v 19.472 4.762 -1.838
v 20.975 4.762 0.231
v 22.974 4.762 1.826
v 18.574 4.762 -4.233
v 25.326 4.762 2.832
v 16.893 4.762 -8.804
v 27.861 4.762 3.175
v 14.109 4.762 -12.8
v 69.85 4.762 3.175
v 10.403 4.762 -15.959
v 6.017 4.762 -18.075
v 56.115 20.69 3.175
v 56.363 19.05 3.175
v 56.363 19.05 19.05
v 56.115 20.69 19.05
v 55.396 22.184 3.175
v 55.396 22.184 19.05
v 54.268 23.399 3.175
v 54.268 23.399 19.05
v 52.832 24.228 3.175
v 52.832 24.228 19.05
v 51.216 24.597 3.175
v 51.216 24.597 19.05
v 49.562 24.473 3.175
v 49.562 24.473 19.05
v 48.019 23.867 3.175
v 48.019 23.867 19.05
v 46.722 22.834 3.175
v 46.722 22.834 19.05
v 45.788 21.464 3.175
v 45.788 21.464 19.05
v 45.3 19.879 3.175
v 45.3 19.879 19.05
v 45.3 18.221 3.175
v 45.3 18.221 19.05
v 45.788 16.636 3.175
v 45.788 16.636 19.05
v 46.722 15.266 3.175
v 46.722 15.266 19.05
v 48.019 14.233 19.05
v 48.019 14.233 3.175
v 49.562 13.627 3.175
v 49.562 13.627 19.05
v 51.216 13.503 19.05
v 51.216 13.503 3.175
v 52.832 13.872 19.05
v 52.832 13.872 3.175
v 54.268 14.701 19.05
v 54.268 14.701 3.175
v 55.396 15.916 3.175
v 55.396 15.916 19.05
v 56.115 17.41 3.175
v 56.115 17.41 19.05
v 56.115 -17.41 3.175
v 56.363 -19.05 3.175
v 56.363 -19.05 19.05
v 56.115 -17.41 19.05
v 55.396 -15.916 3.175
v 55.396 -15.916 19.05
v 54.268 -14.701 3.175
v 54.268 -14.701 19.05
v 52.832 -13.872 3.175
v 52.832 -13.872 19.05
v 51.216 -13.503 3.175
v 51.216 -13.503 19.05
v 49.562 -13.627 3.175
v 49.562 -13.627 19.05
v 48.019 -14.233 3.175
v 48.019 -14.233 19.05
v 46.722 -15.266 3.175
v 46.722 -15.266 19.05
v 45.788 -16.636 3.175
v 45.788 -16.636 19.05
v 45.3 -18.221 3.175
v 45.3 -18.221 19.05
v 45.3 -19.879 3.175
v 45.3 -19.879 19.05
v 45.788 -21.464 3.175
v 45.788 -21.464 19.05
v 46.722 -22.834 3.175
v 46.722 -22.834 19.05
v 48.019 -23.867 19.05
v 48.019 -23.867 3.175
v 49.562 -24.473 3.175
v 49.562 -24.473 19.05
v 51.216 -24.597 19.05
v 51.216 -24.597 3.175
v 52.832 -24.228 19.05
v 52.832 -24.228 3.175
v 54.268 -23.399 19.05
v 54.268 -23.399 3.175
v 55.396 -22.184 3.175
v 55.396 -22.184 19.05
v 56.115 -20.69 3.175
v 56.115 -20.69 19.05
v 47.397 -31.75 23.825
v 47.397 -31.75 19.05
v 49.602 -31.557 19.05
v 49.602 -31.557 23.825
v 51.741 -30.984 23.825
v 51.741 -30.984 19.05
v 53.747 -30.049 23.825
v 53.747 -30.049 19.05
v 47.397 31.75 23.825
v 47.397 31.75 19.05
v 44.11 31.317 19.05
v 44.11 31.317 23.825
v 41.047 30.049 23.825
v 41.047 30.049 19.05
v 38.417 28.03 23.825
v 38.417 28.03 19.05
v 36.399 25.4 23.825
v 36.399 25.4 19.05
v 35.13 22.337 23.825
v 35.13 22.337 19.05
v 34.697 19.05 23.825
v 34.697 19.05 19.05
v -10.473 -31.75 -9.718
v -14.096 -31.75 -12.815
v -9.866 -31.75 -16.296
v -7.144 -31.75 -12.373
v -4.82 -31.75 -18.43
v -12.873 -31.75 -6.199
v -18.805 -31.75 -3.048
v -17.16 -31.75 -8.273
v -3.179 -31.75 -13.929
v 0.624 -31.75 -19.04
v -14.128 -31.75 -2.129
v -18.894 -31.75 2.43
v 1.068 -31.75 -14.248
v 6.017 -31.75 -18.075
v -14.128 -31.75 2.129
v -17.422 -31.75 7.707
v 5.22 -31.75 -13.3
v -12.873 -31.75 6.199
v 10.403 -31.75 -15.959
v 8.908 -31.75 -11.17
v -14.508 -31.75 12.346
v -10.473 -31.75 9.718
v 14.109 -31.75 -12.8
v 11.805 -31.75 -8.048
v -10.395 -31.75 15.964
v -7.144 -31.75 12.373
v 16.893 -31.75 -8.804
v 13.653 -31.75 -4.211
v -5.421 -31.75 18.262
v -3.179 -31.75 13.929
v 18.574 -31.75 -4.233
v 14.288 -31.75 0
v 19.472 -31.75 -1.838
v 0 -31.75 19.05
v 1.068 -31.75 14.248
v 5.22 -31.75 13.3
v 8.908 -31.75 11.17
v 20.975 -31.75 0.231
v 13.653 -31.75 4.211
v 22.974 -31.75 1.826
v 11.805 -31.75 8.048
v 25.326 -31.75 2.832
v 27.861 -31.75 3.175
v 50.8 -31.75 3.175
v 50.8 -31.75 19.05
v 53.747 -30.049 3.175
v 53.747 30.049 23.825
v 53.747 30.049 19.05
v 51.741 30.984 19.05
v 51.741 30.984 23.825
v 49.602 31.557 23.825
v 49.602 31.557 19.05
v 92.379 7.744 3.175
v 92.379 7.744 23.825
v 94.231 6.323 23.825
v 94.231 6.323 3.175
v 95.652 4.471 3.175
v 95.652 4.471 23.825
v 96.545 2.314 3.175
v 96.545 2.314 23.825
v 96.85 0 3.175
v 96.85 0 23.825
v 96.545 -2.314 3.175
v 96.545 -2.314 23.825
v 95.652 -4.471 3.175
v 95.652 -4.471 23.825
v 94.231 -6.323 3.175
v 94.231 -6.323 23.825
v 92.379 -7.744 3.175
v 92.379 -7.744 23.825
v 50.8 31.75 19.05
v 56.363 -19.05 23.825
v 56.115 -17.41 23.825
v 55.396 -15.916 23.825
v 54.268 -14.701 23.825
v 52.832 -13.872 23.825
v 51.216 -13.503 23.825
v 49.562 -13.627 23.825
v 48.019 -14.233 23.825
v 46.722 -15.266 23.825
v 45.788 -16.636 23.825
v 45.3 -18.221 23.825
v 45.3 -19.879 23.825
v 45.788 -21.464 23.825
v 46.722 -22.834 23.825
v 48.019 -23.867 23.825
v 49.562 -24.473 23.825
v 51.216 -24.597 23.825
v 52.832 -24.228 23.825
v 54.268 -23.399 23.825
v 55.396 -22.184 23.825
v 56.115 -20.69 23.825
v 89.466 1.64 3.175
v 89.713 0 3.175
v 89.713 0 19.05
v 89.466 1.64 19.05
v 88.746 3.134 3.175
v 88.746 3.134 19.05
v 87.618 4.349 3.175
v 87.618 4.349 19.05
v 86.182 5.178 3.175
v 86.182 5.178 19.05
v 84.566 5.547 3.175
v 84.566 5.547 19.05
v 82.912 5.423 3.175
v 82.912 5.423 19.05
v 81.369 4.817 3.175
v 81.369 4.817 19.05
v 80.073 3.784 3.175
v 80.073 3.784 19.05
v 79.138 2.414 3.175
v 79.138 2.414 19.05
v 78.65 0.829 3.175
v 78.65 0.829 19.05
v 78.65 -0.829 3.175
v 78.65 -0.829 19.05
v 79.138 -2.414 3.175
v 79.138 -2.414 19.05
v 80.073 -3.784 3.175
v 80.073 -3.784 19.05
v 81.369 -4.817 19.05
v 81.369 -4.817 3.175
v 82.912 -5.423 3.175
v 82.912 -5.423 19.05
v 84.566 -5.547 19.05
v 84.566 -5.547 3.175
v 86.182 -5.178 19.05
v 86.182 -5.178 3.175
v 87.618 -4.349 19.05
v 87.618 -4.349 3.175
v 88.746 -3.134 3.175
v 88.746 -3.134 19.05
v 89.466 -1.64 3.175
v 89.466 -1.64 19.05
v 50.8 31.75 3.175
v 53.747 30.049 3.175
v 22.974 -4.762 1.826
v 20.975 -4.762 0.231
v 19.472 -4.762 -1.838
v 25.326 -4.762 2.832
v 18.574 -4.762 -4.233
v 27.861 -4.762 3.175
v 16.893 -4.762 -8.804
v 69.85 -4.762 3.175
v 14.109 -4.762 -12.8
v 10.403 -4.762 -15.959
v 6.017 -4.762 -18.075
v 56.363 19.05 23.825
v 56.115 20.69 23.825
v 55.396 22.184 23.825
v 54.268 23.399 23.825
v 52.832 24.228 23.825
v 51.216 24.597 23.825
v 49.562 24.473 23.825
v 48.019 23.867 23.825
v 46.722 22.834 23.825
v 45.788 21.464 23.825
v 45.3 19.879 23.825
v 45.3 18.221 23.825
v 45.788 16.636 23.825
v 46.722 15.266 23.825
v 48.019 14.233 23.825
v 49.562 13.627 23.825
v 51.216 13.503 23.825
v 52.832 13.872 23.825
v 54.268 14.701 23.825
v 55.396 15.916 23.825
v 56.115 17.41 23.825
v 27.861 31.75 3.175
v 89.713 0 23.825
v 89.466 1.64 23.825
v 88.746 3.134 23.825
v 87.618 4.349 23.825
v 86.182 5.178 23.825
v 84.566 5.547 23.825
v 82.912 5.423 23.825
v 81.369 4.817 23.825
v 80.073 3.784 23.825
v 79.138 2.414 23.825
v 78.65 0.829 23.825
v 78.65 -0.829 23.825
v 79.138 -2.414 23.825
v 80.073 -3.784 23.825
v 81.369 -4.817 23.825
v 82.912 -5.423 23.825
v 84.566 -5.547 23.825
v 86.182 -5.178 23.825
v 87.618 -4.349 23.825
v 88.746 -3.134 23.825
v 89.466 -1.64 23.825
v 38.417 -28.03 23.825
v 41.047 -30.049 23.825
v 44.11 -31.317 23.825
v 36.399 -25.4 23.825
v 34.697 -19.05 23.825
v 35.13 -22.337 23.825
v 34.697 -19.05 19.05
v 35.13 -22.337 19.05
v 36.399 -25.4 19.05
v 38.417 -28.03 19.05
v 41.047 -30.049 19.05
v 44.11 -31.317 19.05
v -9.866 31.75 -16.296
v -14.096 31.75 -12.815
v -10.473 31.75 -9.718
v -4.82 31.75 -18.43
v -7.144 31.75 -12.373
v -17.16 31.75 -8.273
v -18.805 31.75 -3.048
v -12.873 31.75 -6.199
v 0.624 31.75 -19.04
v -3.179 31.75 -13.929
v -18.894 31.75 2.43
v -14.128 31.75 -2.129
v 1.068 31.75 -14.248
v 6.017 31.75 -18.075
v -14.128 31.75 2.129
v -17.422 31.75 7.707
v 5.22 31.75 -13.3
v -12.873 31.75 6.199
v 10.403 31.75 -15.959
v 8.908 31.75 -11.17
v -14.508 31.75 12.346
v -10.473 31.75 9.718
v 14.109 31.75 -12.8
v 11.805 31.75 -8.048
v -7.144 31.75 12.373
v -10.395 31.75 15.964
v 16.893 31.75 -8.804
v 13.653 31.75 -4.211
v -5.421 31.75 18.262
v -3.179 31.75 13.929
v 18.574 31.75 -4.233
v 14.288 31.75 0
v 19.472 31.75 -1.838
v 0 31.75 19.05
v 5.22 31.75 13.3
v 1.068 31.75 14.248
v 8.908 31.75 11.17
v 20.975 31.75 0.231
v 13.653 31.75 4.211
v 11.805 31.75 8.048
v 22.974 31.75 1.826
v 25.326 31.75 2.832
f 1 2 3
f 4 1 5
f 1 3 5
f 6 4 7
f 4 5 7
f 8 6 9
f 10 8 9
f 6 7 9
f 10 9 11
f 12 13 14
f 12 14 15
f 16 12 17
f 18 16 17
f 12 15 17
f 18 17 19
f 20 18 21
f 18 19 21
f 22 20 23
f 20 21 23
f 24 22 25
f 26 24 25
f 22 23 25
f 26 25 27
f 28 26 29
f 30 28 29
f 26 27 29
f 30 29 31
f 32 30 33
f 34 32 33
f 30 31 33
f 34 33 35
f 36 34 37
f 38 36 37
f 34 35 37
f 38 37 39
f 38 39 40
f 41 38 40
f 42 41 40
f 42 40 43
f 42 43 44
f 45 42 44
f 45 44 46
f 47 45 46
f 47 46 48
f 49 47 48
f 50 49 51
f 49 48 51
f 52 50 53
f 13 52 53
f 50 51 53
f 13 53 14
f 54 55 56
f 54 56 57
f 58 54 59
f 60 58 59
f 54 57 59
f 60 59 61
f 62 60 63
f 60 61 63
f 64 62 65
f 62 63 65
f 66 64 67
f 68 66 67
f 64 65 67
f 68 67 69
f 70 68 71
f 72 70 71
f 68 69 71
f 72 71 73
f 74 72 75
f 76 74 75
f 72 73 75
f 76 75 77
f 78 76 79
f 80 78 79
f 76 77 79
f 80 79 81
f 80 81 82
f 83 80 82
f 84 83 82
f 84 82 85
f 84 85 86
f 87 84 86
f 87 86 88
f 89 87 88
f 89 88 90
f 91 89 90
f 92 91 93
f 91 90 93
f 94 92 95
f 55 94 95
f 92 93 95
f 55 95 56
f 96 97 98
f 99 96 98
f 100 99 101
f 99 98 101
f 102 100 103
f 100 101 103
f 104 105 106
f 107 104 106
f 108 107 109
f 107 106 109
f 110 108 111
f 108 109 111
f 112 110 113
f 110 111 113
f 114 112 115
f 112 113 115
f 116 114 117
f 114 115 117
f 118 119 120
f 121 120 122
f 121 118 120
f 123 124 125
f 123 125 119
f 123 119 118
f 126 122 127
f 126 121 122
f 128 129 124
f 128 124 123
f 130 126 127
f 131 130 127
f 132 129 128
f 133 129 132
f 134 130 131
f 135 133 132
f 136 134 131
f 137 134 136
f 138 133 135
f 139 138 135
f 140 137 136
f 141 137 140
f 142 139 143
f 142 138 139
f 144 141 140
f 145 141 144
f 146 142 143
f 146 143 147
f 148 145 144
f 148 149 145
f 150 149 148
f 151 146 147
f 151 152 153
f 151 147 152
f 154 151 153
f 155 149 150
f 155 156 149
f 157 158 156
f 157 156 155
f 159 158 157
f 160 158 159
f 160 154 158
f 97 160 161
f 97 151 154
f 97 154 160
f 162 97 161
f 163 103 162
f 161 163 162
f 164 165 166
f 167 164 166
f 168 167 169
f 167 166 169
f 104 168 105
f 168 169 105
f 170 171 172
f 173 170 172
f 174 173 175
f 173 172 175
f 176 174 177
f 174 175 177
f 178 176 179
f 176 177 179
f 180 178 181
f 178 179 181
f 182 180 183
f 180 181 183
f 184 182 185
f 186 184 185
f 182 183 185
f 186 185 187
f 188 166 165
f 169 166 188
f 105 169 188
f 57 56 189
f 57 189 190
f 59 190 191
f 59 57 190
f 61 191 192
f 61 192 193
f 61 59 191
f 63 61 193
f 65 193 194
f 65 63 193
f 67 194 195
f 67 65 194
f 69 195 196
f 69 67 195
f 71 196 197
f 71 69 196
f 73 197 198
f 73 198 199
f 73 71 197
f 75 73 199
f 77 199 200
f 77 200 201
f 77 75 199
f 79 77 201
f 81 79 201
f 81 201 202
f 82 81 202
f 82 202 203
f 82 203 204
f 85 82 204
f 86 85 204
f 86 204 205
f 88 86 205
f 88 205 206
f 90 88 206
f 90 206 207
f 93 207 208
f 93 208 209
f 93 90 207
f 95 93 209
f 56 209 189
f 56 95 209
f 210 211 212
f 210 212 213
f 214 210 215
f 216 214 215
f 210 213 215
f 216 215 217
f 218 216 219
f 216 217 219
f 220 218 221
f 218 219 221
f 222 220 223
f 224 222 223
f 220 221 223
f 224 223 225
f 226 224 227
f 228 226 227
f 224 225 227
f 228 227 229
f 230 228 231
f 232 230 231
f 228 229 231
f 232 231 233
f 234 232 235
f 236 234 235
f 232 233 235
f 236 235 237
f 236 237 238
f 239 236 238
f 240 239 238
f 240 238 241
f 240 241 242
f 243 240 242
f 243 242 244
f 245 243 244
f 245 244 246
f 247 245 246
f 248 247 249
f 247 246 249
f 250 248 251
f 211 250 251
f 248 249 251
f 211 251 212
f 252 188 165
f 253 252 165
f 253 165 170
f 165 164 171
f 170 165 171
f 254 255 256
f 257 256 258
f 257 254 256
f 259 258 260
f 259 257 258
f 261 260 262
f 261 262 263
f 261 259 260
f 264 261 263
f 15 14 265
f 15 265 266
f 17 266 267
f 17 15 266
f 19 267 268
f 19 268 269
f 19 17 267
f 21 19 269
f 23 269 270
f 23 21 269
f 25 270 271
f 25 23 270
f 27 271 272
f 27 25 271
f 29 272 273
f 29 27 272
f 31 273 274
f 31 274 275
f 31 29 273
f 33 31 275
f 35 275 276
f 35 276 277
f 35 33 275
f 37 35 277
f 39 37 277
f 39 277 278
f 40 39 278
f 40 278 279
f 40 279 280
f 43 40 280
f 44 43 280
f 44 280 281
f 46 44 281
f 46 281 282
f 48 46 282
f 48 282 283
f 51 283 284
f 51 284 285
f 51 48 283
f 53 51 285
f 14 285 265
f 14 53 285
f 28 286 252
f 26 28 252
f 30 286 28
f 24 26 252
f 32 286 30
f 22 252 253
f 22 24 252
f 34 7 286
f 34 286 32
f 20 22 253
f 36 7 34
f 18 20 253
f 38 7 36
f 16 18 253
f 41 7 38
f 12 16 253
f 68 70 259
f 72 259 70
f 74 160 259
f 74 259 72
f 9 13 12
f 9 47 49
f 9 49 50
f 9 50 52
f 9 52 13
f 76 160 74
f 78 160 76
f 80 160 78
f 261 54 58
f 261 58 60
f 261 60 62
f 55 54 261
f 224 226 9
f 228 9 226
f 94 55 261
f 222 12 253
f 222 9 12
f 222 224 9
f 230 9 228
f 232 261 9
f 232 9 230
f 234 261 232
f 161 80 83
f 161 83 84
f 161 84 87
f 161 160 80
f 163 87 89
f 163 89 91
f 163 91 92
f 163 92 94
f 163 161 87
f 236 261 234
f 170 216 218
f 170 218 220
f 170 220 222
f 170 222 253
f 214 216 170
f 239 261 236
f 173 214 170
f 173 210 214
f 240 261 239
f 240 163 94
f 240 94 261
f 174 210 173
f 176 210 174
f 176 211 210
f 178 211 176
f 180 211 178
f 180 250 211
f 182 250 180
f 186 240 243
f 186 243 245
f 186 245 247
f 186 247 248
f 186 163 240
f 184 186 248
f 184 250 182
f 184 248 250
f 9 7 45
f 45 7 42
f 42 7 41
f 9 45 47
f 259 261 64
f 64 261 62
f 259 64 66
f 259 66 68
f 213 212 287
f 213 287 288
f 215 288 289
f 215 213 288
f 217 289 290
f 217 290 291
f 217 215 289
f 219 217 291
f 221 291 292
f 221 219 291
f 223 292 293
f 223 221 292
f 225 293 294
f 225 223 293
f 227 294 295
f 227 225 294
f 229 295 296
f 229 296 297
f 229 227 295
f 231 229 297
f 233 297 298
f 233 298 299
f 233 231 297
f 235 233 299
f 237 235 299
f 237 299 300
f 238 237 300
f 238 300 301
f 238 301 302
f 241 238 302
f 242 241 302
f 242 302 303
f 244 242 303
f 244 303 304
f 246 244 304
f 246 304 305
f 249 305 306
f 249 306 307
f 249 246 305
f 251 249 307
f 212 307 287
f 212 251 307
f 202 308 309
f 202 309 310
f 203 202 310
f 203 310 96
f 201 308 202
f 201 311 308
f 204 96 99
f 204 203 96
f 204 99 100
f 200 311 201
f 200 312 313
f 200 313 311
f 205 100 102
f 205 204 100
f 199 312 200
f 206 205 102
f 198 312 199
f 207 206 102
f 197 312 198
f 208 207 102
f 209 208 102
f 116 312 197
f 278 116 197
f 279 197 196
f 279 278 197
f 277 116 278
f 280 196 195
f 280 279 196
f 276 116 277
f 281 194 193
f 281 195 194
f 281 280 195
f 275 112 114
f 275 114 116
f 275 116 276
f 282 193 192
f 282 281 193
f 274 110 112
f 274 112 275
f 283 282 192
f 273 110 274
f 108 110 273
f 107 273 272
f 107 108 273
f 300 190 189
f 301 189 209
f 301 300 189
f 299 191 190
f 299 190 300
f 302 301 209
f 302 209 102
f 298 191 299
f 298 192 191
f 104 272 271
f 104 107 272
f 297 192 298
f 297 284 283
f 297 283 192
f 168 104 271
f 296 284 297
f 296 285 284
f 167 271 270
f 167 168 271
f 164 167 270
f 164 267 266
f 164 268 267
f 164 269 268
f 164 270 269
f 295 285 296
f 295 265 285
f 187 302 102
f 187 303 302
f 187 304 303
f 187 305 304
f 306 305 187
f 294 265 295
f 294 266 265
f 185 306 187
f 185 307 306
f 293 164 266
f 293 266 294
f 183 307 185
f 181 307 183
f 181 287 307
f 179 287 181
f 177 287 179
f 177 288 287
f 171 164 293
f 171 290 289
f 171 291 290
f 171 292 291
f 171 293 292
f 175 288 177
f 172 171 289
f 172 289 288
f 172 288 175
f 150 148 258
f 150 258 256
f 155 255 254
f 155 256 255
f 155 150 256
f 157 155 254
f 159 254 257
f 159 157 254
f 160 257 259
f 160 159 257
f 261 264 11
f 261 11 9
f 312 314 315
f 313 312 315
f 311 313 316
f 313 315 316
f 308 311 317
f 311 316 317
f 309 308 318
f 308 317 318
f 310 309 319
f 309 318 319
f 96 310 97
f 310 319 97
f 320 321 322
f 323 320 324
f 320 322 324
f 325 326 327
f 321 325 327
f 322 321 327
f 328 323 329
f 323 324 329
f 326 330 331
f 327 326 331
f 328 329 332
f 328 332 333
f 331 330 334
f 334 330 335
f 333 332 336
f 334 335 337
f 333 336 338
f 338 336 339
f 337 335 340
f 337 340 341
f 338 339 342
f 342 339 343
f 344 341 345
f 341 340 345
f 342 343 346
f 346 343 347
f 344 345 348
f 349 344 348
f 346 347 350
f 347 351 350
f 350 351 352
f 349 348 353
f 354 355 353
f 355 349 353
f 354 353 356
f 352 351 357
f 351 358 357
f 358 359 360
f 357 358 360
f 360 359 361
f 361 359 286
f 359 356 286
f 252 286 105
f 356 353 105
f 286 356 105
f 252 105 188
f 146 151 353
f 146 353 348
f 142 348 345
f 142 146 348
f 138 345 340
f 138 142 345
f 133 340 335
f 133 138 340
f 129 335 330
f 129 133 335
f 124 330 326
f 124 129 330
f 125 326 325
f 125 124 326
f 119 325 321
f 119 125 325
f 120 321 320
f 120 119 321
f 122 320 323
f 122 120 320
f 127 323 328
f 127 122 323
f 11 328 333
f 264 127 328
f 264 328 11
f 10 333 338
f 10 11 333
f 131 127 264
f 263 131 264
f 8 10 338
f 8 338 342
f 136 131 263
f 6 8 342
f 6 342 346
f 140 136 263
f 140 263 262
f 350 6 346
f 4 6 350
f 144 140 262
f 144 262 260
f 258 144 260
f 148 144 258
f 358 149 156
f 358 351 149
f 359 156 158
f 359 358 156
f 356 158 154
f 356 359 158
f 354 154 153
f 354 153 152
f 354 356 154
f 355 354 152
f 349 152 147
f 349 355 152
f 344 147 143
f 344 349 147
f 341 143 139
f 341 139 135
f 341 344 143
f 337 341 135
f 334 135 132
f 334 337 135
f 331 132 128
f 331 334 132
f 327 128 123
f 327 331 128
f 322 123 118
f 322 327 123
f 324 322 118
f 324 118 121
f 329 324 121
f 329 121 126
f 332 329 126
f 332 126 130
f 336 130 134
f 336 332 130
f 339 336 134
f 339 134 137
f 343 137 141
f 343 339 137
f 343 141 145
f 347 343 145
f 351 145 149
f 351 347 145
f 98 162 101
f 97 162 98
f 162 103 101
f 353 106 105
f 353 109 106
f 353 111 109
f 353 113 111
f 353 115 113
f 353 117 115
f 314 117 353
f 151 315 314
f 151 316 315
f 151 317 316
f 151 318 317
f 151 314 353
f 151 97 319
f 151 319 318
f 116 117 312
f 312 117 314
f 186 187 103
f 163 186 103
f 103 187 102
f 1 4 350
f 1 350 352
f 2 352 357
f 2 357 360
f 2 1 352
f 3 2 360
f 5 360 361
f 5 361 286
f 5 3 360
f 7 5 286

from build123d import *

# Parameters (mm, degrees)
F0_R     = 14.2875
F1_DEPTH = 31.75
F2_DEPTH = 4.7625
F3_R     = 5.5626
F4_DEPTH = 4.7752
F5_DEPTH = 15.875
F6_DEPTH = 15.875


with BuildPart() as f1:
    # F0 (on Front) → F1 (new body, symmetric)
    with BuildSketch(Plane.XZ):
        with BuildLine():
            ThreePointArc((0, 19.05), (12.2967221242, 14.5496778315), (18.7835533113, 3.175))
            Line((18.7835533113, 3.175), (27.86051193, 3.175))
            Line((27.86051193, 3.175), (69.85, 3.175))
            Line((69.85, 3.175), (96.8502, 3.175))
            Line((96.8502, 3.175), (96.8502, 19.05))
            Line((96.8502, 19.05), (0, 19.05))
        make_face()
        with BuildLine():
            ThreePointArc((18.57367462, -4.2333333333), (18.930544122, -2.1300232967), (19.05, 0))
            ThreePointArc((19.05, 0), (18.9832714591, 1.5930802583), (18.7835533113, 3.175))
            ThreePointArc((18.7835533113, 3.175), (12.2967221242, 14.5496778315), (0, 19.05))
            ThreePointArc((0, 19.05), (-18.8046153549, -3.0477764606), (6.0170355936, -18.07478306))
            ThreePointArc((6.0170355936, -18.07478306), (14.1092944486, -12.7996214852), (18.57367462, -4.2333333333))
        make_face()
        Circle(F0_R, mode=Mode.SUBTRACT)
        with BuildLine():
            ThreePointArc((18.7835533113, 3.175), (18.9832714591, 1.5930802583), (19.05, 0))
            ThreePointArc((19.05, 0), (18.930544122, -2.1300232967), (18.57367462, -4.2333333333))
            ThreePointArc((18.57367462, -4.2333333333), (21.9206308285, 1.0960350187), (27.86051193, 3.175))
            Line((27.86051193, 3.175), (18.7835533113, 3.175))
        make_face()
    extrude(amount=F1_DEPTH, both=True)

    # F0 (on Front) → F2 (join, symmetric)
    with BuildSketch(Plane.XZ):
        with BuildLine():
            ThreePointArc((27.86051193, 3.175), (21.9206308285, 1.0960350187), (18.57367462, -4.2333333333))
            ThreePointArc((18.57367462, -4.2333333333), (14.1092944486, -12.7996214852), (6.0170355936, -18.07478306))
            Line((6.0170355936, -18.07478306), (69.85, 3.175))
            Line((69.85, 3.175), (27.86051193, 3.175))
        make_face()
    extrude(amount=F2_DEPTH, both=True)

    # F3 (on face) → F4 (join)
    with BuildSketch(Plane.XY.offset(19.05)):
        with BuildLine():
            ThreePointArc((47.3970452561, -31.75), (50.6840471289, -31.3172579939), (53.7470452561, -30.0485226281))
            Line((53.7470452561, -30.0485226281), (92.3789934298, -7.7443569506))
            ThreePointArc((92.3789934298, -7.7443569506), (95.652143832, -4.4712065327), (96.8502, 8.65e-08))
            ThreePointArc((96.8502, 8.65e-08), (95.6521437887, 4.4712066076), (92.3789934298, 7.7443569506))
            Line((92.3789934298, 7.7443569506), (53.7470452561, 30.0485226281))
            ThreePointArc((53.7470452561, 30.0485226281), (50.6840471289, 31.3172579939), (47.3970452561, 31.75))
            ThreePointArc((47.3970452561, 31.75), (38.4167891351, 28.0302561211), (34.6970452561, 19.05))
            Line((34.6970452561, 19.05), (34.6970452561, -19.05))
            ThreePointArc((34.6970452561, -19.05), (38.4167891351, -28.0302561211), (47.3970452561, -31.75))
        make_face()
        with Locations((50.8, -19.05)):
            Circle(F3_R, mode=Mode.SUBTRACT)
        with Locations((84.1502, 0)):
            Circle(F3_R, mode=Mode.SUBTRACT)
        with Locations((50.8, 19.05)):
            Circle(F3_R, mode=Mode.SUBTRACT)
    extrude(amount=F4_DEPTH)

    # F3 (on face) → F5 (cut, through all)
    with BuildSketch(Plane.XY.offset(19.05)):
        Polygon((53.7470452561, -30.0485226281), (50.8, -31.75), (96.8502, -31.75), (96.8502, -5.1629046338), (92.3789934298, -7.7443569506), align=None)
        Polygon((53.7470452561, 30.0485226281), (92.3789934298, 7.7443569506), (96.8502, 5.1629046338), (96.8502, 31.75), (50.8, 31.75), align=None)
        with BuildLine():
            ThreePointArc((92.3789934298, 7.7443569506), (95.6521437887, 4.4712066076), (96.8502, 8.65e-08))
            Line((96.8502, 8.65e-08), (96.8502, 5.1629046338))
            Line((96.8502, 5.1629046338), (92.3789934298, 7.7443569506))
        make_face()
        with BuildLine():
            ThreePointArc((96.8502, 8.65e-08), (95.652143832, -4.4712065327), (92.3789934298, -7.7443569506))
            Line((92.3789934298, -7.7443569506), (96.8502, -5.1629046338))
            Line((96.8502, -5.1629046338), (96.8502, 8.65e-08))
        make_face()
    extrude(amount=-F5_DEPTH, mode=Mode.SUBTRACT)

    # F3 (on face) → F6 (cut, through all)
    with BuildSketch(Plane.XY.offset(19.05)):
        with Locations((84.1502, 0)):
            Circle(F3_R)
        with Locations((50.8, 19.05)):
            Circle(F3_R)
        with Locations((50.8, -19.05)):
            Circle(F3_R)
    extrude(amount=-F6_DEPTH, mode=Mode.SUBTRACT)


solid = f1.part
